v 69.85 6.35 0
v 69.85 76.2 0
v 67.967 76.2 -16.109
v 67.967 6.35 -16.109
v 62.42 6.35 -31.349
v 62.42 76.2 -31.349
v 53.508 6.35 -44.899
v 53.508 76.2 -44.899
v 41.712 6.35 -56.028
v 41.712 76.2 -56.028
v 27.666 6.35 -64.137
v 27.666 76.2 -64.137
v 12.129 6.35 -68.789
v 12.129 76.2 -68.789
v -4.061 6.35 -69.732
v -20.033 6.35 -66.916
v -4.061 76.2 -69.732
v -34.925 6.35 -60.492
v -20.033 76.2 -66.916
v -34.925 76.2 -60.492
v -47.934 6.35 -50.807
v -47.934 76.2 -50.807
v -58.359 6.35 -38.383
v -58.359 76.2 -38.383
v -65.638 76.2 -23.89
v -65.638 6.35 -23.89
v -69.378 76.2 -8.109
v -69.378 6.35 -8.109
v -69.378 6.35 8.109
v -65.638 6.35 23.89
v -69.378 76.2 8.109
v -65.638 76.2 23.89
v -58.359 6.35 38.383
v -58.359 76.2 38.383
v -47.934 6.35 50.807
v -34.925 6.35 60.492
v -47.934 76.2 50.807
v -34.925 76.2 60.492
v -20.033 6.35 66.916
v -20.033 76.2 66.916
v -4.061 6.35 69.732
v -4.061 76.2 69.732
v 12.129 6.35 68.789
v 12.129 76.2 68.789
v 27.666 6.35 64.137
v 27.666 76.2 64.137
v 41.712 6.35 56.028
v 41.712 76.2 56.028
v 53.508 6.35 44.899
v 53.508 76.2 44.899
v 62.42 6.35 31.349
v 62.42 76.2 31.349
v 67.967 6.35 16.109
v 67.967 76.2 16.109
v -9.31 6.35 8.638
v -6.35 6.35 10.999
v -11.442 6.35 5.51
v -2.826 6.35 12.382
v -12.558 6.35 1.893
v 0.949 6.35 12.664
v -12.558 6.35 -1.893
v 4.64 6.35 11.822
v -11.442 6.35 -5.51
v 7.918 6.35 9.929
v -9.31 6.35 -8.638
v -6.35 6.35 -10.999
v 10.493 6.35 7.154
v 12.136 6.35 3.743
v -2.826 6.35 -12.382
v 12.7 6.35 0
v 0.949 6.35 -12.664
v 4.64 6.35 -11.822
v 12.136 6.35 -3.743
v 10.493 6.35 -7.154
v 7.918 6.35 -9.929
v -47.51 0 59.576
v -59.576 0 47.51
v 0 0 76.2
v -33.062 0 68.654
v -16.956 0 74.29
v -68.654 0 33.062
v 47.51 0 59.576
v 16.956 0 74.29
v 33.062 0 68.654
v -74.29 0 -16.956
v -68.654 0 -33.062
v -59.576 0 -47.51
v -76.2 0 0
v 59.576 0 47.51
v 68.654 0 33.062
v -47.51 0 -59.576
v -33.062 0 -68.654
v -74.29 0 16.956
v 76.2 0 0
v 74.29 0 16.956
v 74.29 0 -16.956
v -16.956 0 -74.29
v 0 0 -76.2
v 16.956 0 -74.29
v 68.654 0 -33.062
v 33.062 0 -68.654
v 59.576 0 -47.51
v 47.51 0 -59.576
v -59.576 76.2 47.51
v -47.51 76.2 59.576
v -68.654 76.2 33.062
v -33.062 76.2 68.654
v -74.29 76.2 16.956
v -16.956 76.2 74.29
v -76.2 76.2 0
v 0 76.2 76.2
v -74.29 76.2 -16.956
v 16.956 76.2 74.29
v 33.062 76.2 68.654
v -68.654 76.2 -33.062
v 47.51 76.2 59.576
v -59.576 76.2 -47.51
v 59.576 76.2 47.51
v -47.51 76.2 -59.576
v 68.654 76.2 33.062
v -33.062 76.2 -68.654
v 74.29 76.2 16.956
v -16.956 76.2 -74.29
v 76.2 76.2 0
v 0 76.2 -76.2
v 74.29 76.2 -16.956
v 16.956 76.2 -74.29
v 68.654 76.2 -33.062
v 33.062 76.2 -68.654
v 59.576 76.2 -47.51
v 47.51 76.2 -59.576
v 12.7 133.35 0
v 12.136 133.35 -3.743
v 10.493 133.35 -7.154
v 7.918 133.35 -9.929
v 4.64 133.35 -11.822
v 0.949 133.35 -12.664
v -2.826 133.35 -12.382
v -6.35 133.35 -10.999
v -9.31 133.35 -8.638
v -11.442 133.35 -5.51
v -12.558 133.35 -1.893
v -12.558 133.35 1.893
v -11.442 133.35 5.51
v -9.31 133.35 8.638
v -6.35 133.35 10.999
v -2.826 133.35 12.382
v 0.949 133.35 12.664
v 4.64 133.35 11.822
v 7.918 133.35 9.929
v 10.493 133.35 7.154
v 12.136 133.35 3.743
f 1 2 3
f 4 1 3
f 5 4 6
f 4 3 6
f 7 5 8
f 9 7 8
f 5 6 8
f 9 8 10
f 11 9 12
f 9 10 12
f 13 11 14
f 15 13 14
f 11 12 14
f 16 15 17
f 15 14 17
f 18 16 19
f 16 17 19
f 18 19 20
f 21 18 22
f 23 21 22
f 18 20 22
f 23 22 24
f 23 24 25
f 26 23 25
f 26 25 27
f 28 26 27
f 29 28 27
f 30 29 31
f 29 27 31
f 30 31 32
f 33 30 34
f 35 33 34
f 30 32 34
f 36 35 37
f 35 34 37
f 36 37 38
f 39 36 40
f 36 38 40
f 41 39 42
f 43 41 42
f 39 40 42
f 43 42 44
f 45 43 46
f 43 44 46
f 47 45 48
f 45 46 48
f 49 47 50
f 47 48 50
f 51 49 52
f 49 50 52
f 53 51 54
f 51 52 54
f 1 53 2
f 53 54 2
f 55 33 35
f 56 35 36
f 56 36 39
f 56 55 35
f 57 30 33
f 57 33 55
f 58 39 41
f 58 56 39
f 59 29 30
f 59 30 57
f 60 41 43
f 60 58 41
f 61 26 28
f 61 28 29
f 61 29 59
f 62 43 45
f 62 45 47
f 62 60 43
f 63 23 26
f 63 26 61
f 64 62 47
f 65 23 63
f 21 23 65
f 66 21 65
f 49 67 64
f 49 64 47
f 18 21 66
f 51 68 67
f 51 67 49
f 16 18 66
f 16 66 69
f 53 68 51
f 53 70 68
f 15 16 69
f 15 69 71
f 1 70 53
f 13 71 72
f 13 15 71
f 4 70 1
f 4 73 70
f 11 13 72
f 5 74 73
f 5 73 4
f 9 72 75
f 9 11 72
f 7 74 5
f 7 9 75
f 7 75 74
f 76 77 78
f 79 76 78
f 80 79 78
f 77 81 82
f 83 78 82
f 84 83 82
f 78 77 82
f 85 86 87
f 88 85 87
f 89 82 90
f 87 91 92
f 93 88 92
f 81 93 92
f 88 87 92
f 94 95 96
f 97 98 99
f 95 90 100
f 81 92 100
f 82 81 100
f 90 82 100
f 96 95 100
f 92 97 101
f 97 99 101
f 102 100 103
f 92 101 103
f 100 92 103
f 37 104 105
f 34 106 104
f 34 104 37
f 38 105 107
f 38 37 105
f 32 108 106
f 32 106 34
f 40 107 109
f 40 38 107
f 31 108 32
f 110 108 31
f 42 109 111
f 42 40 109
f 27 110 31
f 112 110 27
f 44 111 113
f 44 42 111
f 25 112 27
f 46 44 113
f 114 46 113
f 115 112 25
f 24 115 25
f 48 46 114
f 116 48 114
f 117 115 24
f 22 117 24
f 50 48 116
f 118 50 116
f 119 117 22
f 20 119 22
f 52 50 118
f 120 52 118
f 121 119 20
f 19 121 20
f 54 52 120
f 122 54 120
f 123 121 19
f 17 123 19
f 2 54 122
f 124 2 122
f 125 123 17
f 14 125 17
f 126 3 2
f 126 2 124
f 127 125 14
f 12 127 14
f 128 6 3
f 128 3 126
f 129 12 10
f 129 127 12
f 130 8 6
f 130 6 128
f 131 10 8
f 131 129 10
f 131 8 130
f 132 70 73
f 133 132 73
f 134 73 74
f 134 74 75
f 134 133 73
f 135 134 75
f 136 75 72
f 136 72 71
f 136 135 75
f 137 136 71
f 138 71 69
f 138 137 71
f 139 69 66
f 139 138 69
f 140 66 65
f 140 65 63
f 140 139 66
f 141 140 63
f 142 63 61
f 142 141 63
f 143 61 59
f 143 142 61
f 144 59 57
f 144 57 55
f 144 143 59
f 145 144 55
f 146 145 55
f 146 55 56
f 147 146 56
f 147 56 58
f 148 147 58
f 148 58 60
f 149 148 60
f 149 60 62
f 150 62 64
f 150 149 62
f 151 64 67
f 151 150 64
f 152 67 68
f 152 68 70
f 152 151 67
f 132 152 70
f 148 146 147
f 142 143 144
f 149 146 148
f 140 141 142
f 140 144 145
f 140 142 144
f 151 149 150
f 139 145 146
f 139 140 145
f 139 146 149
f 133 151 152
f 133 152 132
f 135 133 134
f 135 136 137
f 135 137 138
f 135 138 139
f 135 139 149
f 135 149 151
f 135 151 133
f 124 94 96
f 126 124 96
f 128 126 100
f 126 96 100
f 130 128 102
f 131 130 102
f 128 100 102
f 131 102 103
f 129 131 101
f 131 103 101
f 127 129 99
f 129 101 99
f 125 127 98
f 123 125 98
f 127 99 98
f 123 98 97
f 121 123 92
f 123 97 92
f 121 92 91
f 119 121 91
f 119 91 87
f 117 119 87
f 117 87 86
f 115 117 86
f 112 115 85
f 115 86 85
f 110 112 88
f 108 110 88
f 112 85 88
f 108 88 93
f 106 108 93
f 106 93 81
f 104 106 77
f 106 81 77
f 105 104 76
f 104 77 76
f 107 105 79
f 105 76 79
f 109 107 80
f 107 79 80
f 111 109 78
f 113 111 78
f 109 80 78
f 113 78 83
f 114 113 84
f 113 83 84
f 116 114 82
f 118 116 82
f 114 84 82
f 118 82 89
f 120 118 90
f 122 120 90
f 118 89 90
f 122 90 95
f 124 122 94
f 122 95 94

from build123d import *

# Parameters (mm, degrees)
SKETCH1_R           = 76.2
BOSS_EXTRUDE1_DEPTH = 76.2
SKETCH2_R           = 12.7
BOSS_EXTRUDE2_DEPTH = 57.15
SKETCH3_R           = 69.85
SKETCH3_R_2         = 12.7
CUT_EXTRUDE1_DEPTH  = 69.85


with BuildPart() as part:
    # Sketch1 → Boss-Extrude1 (new body)
    with BuildSketch(Plane(origin=(0, 0, 0), x_dir=(1, 0, 0), z_dir=(0, 1, 0))):
        Circle(SKETCH1_R)
    extrude(amount=BOSS_EXTRUDE1_DEPTH)

    # Sketch2 → Boss-Extrude2 (add)
    with BuildSketch(Plane(origin=(0, 76.2, 0), x_dir=(1, 0, 0), z_dir=(0, 1, 0))):
        Circle(SKETCH2_R)
    extrude(amount=BOSS_EXTRUDE2_DEPTH)

    # Sketch3 → Cut-Extrude1 (cut)
    with BuildSketch(Plane(origin=(0, 76.2, 0), x_dir=(1, 0, 0), z_dir=(0, 1, 0))):
        Circle(SKETCH3_R)
        Circle(SKETCH3_R_2, mode=Mode.SUBTRACT)
    extrude(amount=-CUT_EXTRUDE1_DEPTH, mode=Mode.SUBTRACT)


solid = part.part
